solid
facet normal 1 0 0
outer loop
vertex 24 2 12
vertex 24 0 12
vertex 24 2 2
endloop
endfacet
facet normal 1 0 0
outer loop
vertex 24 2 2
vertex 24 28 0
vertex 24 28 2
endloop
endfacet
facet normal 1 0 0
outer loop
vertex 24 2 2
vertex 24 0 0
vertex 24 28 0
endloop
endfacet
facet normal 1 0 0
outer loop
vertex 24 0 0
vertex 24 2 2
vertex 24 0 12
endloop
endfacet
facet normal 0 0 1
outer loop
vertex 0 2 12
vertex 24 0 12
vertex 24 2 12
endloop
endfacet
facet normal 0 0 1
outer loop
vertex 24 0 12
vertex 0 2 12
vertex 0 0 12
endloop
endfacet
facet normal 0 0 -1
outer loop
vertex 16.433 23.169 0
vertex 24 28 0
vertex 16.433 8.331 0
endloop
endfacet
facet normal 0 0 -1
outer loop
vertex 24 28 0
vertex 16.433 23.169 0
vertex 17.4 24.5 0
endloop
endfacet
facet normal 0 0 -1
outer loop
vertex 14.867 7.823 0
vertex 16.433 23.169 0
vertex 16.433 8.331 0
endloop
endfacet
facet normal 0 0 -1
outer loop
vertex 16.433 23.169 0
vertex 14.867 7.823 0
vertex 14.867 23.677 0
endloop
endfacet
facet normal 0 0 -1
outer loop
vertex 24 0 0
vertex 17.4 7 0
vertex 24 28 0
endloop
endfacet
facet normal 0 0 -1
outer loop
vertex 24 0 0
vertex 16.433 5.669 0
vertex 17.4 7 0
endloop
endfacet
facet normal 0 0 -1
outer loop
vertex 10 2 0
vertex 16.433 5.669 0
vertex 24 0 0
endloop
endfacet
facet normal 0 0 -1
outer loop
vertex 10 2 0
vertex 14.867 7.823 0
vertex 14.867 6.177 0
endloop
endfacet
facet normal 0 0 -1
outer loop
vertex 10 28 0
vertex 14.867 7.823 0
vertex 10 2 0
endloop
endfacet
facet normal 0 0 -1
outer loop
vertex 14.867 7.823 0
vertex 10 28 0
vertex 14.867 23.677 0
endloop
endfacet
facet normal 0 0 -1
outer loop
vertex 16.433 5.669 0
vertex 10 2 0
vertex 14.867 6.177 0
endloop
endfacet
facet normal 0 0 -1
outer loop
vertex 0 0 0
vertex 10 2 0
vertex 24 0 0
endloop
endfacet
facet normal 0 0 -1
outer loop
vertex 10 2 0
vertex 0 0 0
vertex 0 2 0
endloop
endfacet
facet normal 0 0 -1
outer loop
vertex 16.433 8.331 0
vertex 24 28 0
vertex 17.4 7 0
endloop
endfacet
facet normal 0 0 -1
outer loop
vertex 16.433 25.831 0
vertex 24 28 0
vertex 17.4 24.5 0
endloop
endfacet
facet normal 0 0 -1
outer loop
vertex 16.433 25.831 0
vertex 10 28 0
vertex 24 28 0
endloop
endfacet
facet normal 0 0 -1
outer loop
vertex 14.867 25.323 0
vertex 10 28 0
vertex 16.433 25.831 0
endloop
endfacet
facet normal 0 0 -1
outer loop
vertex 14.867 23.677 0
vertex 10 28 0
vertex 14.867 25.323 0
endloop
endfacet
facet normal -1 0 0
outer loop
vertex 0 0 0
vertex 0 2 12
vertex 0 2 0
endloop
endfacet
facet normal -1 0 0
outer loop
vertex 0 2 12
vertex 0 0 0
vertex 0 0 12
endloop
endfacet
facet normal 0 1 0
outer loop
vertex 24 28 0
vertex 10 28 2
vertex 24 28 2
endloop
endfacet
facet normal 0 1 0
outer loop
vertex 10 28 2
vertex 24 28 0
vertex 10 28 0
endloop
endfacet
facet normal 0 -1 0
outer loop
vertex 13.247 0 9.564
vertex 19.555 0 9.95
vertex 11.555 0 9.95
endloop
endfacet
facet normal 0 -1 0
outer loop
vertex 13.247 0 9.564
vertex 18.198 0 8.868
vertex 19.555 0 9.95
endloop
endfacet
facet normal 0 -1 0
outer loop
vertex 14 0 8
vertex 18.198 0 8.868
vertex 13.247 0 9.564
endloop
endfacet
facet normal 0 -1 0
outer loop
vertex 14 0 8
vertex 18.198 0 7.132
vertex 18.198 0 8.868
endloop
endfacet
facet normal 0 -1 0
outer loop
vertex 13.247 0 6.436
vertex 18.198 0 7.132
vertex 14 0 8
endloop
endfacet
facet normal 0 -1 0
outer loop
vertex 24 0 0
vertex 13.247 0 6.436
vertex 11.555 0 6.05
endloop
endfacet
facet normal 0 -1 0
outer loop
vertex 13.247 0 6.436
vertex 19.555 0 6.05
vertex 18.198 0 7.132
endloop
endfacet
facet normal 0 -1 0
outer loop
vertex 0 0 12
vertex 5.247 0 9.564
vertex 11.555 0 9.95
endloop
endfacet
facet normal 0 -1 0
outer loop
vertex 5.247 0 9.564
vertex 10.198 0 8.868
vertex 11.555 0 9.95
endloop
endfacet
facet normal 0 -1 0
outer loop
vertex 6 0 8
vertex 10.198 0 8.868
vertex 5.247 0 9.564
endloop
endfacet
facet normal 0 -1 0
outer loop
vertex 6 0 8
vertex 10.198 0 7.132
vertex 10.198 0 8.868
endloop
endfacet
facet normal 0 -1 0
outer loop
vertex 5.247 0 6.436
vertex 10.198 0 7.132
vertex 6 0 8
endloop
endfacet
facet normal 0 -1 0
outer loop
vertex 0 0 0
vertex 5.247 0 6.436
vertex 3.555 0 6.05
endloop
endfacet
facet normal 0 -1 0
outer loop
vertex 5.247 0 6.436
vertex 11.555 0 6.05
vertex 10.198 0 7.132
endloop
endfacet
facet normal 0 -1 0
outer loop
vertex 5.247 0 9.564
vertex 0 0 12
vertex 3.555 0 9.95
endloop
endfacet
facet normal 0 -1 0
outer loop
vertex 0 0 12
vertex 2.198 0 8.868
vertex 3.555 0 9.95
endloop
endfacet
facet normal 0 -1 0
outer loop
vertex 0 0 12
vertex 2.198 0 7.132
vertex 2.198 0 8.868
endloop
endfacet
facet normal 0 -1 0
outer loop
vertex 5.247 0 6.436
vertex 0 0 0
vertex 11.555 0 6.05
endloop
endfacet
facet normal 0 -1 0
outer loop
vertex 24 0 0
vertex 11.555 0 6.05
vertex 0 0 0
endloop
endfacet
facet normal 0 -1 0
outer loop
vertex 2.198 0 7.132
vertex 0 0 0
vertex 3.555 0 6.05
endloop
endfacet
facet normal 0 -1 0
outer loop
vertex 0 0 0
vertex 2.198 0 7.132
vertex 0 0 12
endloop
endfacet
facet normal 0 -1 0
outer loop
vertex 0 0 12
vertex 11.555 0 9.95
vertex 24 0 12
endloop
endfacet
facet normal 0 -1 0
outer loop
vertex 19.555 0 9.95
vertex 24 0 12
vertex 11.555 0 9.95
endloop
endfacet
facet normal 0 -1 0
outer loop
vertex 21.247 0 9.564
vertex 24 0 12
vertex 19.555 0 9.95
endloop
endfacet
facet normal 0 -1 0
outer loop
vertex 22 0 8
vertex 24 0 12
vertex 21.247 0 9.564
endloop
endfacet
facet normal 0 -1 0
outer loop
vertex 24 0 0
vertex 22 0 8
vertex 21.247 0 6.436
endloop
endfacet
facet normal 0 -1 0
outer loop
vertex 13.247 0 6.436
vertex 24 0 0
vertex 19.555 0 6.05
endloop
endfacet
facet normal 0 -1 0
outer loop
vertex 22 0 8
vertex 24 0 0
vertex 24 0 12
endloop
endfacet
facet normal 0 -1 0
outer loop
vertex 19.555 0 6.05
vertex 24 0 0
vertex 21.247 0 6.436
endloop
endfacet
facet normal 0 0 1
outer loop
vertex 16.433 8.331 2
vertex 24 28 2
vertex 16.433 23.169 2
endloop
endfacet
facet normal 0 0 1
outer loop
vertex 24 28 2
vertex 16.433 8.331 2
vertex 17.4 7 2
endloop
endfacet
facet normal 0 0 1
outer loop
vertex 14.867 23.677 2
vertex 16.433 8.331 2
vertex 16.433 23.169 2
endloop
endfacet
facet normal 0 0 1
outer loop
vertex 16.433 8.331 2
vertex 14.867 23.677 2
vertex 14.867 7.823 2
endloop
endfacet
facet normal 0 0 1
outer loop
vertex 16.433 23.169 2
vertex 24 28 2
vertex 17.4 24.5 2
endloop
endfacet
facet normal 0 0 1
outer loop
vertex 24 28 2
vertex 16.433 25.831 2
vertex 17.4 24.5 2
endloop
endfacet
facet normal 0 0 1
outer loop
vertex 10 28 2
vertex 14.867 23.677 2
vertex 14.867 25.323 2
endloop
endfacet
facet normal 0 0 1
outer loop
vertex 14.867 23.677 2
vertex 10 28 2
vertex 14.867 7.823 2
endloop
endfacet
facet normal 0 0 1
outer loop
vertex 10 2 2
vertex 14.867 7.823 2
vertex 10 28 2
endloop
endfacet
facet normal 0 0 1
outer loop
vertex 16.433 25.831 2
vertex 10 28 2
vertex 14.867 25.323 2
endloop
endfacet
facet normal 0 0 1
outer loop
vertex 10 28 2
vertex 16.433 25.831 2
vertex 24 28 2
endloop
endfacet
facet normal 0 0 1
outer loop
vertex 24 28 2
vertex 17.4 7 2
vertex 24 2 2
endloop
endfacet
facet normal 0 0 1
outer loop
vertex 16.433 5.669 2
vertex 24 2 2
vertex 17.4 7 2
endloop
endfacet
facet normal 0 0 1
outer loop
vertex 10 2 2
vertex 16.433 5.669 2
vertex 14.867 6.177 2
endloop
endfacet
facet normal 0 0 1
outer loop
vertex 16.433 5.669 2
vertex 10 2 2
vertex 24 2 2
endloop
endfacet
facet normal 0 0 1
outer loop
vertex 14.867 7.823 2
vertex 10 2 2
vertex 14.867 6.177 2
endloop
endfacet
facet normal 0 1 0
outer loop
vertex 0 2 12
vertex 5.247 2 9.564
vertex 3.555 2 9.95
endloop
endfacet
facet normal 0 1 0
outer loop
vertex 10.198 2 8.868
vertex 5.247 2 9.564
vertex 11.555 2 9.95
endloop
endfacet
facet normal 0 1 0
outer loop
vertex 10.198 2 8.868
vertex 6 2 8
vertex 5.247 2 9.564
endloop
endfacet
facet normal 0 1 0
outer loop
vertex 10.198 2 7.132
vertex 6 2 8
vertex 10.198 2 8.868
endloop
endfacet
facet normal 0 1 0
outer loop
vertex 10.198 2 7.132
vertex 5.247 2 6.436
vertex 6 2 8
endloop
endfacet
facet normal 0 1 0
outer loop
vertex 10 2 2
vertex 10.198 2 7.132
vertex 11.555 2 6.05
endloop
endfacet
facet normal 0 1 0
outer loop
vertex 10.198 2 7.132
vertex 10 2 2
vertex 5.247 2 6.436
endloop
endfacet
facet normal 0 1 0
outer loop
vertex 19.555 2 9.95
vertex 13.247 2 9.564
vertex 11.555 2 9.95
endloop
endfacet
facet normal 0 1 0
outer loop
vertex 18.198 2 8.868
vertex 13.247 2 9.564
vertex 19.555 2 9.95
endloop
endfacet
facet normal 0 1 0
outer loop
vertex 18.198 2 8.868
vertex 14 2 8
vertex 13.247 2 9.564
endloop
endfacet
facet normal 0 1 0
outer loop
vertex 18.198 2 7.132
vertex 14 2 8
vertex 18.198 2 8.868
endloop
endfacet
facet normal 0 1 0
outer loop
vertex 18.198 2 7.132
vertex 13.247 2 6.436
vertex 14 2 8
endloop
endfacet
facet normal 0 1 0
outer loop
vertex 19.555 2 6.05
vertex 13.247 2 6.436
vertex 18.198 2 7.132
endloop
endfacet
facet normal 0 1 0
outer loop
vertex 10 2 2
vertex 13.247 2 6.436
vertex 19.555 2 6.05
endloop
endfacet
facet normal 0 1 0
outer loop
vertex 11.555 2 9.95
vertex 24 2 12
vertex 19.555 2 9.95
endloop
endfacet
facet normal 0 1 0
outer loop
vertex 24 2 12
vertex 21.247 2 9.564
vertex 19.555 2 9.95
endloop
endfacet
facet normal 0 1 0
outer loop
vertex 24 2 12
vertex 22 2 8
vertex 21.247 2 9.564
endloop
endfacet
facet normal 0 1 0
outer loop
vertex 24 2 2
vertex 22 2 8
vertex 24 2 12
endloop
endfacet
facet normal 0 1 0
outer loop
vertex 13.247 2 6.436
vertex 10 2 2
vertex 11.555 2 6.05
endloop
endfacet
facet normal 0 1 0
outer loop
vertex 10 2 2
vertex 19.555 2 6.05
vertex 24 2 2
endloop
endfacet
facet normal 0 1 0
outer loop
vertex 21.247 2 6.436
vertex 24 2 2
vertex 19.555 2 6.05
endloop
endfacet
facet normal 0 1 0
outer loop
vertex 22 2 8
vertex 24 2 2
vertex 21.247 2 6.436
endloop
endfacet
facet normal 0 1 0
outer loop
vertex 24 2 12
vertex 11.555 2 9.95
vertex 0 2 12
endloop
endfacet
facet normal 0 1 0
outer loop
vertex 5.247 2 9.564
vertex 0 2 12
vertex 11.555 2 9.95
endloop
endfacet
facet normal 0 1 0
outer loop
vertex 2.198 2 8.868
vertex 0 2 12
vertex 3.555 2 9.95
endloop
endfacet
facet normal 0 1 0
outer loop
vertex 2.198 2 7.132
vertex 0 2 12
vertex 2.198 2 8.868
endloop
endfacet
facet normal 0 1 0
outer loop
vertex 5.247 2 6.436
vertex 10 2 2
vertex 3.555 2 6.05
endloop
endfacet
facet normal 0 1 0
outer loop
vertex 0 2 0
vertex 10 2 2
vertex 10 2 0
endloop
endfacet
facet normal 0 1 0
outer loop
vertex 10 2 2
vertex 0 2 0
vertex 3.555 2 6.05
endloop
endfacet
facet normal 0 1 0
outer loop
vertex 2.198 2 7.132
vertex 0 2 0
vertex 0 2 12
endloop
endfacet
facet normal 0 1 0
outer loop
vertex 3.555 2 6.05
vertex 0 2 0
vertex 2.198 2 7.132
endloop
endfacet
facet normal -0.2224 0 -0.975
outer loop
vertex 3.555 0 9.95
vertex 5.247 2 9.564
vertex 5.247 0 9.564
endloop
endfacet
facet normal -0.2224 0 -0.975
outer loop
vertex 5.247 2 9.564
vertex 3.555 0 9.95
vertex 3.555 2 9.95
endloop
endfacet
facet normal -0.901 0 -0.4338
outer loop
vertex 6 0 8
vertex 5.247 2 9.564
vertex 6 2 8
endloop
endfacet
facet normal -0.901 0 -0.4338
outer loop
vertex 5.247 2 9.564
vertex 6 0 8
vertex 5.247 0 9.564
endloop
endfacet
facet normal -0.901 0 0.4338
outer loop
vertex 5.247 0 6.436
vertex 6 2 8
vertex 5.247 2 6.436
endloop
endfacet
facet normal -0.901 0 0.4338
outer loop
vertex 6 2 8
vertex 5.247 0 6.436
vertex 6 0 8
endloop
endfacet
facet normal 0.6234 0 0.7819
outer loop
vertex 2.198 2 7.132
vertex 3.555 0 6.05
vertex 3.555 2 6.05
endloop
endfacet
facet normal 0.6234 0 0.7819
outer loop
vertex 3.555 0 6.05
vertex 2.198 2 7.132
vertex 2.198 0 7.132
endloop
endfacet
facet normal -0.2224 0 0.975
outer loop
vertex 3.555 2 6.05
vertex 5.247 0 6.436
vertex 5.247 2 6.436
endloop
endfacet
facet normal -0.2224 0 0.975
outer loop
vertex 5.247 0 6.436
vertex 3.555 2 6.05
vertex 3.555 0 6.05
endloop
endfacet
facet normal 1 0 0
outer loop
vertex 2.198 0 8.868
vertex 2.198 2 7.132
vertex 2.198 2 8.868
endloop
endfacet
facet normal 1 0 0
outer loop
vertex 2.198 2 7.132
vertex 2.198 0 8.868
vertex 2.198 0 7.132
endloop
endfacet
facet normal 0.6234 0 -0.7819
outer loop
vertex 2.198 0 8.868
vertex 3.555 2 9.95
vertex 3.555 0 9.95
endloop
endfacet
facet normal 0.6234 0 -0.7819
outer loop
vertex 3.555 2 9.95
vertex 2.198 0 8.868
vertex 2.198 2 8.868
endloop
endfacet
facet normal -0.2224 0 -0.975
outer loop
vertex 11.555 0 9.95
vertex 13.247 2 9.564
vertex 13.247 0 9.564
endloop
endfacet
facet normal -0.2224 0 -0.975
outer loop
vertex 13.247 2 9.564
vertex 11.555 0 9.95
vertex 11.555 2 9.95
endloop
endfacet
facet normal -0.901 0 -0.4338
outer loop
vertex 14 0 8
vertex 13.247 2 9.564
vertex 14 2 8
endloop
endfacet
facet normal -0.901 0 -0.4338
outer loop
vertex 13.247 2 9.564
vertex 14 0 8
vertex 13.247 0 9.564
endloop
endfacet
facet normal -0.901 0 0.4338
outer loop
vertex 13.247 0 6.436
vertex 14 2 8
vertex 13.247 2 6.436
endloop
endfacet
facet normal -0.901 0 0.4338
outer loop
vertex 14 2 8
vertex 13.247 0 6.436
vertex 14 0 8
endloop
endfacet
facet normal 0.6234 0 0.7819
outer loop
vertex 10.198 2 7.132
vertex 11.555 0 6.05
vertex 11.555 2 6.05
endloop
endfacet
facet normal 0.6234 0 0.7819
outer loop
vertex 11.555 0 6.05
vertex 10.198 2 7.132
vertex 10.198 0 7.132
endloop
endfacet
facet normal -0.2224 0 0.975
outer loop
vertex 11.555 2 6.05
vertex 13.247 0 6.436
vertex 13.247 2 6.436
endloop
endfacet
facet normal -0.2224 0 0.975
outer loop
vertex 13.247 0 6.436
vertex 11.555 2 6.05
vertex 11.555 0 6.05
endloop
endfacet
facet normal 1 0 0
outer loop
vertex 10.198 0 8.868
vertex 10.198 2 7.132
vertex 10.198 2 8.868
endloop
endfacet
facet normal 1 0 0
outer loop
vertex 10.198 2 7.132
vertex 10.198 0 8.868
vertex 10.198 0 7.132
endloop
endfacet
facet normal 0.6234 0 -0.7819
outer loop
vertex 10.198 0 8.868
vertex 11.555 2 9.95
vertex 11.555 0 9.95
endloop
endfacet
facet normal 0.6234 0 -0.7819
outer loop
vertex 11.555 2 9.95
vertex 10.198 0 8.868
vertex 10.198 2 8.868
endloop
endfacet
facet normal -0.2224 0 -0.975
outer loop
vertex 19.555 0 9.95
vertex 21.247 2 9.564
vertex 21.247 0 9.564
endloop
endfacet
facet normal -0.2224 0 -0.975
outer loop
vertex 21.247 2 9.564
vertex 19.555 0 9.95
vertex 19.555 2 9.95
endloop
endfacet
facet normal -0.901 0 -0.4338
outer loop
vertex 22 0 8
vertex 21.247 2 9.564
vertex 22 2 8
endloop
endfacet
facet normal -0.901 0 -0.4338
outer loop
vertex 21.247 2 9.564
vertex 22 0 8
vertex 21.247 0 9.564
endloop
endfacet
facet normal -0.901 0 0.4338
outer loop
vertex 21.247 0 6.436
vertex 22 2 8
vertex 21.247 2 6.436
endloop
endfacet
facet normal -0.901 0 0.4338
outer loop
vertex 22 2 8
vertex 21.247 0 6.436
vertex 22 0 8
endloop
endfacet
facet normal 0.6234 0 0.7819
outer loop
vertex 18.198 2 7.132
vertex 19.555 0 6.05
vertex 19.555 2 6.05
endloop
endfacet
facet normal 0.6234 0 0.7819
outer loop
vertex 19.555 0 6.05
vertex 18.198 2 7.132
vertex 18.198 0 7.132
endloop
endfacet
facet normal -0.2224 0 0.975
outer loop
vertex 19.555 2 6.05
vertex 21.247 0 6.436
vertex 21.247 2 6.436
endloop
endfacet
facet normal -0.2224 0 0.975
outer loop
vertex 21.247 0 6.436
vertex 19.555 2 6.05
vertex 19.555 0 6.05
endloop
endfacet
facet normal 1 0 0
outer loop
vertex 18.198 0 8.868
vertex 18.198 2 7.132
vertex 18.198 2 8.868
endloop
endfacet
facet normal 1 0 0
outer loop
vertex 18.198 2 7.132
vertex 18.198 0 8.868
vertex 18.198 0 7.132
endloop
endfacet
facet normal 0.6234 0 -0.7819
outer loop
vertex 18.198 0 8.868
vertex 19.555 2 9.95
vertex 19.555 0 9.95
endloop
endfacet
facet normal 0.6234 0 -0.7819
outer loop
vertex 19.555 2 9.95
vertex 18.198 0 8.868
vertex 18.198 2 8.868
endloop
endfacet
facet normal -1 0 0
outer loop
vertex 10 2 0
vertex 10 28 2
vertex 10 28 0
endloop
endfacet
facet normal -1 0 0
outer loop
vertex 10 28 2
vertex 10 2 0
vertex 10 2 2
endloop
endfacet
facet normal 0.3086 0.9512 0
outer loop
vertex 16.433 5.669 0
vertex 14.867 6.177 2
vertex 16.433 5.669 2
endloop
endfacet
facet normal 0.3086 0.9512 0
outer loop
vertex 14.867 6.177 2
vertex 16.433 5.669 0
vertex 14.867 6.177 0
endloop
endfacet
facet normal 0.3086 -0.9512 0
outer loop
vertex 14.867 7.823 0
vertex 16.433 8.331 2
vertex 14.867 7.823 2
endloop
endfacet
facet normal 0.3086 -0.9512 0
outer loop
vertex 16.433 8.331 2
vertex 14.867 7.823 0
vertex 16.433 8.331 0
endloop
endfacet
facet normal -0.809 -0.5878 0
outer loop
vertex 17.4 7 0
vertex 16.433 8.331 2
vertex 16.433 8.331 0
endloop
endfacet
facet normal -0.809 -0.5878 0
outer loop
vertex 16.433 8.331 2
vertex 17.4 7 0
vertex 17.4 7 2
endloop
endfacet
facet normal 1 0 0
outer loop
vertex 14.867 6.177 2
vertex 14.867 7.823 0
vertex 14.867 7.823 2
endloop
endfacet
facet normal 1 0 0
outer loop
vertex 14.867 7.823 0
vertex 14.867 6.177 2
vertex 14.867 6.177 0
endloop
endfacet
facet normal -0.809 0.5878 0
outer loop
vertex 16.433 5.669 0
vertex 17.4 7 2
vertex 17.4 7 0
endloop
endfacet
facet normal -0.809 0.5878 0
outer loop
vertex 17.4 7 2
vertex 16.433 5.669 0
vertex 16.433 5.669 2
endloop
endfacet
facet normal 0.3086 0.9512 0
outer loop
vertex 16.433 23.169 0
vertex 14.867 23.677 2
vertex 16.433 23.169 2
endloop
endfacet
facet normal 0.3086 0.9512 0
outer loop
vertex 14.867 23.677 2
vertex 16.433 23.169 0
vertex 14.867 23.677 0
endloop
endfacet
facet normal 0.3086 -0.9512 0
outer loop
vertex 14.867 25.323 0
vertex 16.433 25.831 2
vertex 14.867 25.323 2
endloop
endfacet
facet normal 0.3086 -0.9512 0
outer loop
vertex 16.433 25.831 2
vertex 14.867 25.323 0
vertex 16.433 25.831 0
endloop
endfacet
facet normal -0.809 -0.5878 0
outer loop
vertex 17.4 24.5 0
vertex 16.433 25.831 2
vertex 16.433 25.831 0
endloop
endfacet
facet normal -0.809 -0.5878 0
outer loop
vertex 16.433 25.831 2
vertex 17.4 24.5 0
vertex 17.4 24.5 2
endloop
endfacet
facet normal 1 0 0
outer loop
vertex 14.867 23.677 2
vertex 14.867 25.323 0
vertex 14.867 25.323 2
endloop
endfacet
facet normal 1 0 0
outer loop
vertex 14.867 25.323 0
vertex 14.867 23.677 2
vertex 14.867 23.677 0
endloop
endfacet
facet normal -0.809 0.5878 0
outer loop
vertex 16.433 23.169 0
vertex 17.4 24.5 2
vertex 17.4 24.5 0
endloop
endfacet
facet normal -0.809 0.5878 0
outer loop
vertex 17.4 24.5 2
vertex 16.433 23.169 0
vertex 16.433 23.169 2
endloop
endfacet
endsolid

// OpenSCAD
epaisseur = 2;
hauteur = 1;
profondeur = 3;
largeur = 3;
difference(){
difference(){
    cube([largeur*8,profondeur*8+4,hauteur*8+4]);
    translate([0, epaisseur, epaisseur]){
        cube([largeur*8,profondeur*8+4,hauteur*8+4]);};
};

translate([0, epaisseur,0]){cube([10, profondeur*8+4, hauteur*8+4]);};
translate([(largeur-1)*8, 7, 0]){
    cylinder(h=epaisseur, r=1.4);
    };  
    
translate([(largeur-1)*8, 24.5, 0]){
    cylinder(h=epaisseur, r=1.4);
    };  
    
translate([0,4,0]){   
    rotate([90,0,0]){
        union(){
            for(i=[0:largeur-1]){
                for(j=[0:hauteur-1]){
                    translate([4+ 8*i, 8+8*j, 0]){cylinder(h=4, r=2);}
                }
            }
        }
    }
}


}
